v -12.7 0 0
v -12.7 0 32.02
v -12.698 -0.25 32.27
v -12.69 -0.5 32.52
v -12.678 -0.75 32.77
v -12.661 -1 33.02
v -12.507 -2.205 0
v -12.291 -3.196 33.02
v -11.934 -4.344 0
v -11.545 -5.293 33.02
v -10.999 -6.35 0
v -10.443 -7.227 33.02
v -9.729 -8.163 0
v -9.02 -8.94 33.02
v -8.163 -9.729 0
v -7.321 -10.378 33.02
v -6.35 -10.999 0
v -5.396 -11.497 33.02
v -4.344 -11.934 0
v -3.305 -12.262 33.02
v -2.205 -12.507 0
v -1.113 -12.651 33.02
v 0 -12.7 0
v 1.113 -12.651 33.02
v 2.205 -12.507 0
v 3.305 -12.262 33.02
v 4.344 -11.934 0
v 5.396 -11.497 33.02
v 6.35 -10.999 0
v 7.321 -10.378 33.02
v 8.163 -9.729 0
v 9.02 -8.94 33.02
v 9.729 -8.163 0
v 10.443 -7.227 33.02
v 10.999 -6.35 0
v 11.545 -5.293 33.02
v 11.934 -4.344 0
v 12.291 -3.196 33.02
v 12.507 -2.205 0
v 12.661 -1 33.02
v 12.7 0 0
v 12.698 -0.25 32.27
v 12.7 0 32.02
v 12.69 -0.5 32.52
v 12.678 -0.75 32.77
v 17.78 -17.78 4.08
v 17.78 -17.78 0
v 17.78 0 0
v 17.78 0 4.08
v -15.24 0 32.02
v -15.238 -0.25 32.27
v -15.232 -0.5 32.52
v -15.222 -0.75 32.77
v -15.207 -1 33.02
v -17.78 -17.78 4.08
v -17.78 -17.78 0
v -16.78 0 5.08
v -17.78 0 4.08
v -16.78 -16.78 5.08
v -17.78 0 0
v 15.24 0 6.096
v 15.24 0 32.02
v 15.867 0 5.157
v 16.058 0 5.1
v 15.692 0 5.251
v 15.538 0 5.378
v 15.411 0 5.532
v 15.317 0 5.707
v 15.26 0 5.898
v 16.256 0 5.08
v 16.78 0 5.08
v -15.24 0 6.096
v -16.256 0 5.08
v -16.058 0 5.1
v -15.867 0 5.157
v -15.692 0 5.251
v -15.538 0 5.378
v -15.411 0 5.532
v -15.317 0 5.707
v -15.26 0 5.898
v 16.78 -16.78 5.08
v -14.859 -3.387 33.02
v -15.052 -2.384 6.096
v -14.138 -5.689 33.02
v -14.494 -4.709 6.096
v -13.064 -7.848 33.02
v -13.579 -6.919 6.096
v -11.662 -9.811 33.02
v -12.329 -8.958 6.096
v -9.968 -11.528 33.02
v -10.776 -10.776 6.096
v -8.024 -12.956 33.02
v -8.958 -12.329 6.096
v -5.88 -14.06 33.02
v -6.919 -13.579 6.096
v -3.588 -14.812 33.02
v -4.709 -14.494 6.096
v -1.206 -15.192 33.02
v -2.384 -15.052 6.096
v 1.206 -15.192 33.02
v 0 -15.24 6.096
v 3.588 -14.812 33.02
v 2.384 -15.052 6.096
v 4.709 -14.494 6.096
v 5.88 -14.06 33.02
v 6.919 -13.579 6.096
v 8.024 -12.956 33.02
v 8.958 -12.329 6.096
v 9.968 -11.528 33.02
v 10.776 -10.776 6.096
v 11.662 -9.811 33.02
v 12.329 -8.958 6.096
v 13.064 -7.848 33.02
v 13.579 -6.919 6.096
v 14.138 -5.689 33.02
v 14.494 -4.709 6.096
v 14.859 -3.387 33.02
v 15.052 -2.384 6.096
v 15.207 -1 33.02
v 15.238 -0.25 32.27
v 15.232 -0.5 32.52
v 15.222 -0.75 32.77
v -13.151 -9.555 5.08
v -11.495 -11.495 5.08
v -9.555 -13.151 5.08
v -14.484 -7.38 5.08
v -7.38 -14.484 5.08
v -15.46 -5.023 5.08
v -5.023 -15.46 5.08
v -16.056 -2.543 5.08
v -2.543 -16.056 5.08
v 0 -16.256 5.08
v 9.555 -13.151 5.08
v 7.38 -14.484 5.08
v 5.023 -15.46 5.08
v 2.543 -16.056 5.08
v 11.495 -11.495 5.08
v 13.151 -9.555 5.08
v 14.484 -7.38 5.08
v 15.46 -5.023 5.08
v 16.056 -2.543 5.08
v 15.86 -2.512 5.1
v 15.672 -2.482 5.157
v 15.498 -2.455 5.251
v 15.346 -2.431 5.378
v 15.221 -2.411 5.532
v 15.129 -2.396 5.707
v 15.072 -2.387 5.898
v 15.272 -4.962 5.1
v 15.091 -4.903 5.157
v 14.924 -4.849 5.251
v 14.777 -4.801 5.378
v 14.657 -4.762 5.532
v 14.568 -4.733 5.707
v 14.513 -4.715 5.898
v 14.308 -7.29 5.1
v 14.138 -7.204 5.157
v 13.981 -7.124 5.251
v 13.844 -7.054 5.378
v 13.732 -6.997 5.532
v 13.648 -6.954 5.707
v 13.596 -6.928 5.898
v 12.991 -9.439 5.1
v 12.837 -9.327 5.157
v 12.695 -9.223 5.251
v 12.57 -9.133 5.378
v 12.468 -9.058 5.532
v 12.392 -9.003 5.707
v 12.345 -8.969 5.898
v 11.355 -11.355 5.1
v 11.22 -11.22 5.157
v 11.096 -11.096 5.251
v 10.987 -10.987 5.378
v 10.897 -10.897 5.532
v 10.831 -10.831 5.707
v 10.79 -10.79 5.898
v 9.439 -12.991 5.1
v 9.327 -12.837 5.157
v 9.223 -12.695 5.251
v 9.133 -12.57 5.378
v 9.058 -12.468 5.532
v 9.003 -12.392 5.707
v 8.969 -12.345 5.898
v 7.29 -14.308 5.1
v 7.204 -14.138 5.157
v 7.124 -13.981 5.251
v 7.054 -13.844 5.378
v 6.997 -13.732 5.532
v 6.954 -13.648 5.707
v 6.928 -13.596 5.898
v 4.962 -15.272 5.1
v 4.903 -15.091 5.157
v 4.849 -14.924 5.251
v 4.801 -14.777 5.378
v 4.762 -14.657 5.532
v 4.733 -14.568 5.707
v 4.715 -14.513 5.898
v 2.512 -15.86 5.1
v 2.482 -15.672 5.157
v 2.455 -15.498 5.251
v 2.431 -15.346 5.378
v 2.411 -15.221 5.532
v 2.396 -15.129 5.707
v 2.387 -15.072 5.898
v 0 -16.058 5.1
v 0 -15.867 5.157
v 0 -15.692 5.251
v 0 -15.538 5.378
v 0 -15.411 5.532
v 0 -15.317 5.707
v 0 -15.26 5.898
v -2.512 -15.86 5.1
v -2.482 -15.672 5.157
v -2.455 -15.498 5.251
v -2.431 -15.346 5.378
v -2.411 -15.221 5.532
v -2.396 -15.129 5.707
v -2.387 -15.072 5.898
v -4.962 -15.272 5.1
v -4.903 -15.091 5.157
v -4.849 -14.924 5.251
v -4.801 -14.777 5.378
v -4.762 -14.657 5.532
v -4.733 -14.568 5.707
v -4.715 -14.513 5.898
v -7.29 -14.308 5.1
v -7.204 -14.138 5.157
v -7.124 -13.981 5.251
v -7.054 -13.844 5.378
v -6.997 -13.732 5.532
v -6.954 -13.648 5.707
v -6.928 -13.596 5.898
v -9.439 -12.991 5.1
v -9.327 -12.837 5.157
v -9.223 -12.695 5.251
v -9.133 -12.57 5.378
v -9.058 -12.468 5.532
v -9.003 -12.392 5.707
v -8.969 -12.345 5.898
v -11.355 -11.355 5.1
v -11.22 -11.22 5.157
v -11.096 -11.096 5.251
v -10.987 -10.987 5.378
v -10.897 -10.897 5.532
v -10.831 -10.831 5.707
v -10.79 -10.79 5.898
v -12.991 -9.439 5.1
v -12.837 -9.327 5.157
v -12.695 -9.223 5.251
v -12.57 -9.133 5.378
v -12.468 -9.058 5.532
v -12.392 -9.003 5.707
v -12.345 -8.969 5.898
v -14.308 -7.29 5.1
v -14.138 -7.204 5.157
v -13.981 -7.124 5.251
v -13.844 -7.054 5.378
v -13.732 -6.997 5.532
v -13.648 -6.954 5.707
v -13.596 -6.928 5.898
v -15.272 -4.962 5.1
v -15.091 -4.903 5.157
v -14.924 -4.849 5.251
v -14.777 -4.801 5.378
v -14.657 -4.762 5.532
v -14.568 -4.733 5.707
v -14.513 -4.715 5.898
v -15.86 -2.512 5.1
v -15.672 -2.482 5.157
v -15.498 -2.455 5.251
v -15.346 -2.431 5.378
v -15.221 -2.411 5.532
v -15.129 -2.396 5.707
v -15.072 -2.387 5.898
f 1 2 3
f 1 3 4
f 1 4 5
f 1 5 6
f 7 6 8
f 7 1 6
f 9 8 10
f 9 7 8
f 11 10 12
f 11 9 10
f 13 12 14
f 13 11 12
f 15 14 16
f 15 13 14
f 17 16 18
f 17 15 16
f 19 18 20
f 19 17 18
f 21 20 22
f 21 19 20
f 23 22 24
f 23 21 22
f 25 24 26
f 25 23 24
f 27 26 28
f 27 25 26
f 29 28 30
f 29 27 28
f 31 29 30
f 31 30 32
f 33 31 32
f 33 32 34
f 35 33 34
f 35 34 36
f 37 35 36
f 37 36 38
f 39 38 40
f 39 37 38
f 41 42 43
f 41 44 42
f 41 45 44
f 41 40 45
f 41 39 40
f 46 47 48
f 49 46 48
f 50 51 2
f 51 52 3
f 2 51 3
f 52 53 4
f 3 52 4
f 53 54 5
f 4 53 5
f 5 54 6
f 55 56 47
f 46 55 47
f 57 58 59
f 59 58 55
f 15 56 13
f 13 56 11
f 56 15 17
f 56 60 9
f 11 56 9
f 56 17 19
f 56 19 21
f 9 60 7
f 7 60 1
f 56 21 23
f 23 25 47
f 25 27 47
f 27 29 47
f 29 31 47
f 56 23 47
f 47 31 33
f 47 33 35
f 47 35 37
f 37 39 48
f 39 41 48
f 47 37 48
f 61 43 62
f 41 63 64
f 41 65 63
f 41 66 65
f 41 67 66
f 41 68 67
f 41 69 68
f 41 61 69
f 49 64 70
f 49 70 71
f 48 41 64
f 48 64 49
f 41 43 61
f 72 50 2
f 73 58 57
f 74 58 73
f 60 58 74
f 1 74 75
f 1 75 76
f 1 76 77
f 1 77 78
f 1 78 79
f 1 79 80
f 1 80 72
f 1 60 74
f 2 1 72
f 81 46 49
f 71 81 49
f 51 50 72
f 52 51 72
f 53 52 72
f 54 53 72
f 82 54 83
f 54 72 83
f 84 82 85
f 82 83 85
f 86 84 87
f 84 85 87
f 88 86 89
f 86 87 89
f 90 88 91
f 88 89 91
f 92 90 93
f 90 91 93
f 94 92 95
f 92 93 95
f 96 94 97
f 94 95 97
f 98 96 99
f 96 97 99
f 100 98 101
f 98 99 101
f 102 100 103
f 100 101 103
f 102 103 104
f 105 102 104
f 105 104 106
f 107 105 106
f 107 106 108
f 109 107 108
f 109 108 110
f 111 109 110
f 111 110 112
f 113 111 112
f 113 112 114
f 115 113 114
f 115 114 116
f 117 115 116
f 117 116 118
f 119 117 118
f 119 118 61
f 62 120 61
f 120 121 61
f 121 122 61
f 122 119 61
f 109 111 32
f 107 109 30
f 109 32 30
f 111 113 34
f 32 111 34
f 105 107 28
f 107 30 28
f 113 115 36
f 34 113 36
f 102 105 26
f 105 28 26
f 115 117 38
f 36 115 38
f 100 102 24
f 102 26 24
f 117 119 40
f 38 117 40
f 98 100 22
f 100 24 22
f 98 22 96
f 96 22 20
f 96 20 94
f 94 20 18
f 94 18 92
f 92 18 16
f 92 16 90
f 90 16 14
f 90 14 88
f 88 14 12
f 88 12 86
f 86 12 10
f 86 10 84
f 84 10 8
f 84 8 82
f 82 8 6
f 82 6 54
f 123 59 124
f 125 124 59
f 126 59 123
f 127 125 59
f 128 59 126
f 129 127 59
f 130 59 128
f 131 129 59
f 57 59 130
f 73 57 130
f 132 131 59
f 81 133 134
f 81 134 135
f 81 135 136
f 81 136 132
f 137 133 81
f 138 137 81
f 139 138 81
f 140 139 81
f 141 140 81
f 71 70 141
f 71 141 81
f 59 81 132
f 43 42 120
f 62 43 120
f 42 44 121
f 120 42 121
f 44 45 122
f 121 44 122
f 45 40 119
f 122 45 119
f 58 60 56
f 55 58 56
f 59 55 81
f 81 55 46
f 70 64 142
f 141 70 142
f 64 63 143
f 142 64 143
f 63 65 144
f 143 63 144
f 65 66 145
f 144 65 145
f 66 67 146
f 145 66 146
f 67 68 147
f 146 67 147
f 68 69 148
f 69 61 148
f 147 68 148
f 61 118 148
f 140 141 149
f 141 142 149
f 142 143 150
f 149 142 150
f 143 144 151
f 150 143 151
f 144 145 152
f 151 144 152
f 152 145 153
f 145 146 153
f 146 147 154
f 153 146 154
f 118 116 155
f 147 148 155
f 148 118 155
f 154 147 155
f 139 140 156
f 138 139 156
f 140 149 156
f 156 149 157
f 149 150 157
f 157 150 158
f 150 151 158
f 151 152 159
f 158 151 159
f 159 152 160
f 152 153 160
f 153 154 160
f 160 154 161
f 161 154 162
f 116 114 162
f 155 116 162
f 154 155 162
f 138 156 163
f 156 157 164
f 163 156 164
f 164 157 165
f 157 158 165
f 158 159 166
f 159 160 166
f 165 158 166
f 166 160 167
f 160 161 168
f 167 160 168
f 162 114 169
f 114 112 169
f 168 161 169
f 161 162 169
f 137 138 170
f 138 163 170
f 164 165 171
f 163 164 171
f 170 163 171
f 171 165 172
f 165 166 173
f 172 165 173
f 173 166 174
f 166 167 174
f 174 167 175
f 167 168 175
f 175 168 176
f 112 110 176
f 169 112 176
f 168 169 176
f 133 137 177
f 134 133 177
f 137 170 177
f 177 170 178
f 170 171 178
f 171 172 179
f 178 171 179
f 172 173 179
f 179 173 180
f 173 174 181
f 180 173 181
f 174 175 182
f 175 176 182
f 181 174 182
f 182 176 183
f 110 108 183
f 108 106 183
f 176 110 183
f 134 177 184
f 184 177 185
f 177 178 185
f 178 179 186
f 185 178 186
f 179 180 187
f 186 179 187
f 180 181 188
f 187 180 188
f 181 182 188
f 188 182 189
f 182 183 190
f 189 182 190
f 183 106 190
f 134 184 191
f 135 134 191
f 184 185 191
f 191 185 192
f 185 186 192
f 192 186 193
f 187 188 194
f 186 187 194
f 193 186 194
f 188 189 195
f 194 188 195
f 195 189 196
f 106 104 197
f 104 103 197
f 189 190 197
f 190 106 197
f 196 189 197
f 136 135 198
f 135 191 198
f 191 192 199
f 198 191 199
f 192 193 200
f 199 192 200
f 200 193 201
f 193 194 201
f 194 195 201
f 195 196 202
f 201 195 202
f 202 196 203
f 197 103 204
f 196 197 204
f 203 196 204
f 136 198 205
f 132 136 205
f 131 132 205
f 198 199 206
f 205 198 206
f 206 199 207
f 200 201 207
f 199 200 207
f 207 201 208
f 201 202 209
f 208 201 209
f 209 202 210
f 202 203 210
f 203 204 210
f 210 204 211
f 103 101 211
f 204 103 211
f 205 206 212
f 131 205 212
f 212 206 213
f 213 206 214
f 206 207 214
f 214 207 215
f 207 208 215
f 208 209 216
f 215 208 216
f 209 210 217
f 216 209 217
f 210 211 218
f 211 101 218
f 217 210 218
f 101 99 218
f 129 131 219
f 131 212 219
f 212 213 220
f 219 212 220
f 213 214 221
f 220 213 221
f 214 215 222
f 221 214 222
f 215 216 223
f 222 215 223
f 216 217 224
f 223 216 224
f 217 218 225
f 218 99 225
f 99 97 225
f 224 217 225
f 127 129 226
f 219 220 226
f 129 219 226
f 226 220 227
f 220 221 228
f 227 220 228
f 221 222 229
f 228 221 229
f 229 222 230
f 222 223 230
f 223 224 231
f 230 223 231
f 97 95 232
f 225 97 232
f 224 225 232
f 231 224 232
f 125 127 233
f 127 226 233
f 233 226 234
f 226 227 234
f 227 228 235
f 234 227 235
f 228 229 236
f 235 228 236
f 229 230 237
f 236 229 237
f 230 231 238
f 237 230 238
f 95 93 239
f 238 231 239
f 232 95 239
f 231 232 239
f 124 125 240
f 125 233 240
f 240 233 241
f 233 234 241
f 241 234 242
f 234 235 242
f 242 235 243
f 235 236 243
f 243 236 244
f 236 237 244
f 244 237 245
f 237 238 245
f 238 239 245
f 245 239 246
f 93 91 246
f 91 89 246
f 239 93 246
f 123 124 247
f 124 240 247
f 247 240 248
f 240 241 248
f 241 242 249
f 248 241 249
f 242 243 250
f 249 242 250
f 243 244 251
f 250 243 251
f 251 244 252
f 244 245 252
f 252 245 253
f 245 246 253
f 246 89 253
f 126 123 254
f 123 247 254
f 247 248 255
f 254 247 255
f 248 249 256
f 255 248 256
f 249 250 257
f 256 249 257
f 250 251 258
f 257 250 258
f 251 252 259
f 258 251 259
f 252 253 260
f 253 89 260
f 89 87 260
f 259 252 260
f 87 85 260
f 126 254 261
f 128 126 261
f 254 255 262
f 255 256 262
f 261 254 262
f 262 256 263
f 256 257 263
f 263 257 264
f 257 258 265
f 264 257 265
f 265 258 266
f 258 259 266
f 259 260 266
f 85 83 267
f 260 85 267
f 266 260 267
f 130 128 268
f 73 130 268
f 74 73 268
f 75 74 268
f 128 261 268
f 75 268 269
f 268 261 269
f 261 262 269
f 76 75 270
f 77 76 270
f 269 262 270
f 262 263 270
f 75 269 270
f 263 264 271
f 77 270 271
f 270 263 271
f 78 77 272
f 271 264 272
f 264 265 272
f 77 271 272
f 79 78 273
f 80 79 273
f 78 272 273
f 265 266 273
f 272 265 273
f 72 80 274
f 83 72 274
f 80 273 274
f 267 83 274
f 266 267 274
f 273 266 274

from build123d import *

# Parameters (mm, degrees)
PAD_DEPTH    = 33.02
PAD001_DEPTH = 5.08
FILLET_R     = 1.016
CHAMFER_SIZE = 1


with BuildPart() as part:
    # Sketch001 → Pad (new body)
    with BuildSketch(Plane.XY):
        with BuildLine():
            ThreePointArc((-12.7, 0), (0, -12.7), (12.7, 0))
            Line((12.7, 0), (15.24, 0))
            ThreePointArc((-15.24, 0), (0, -15.24), (15.24, 0))
            Line((-15.24, 0), (-12.7, 0))
        make_face()
    extrude(amount=PAD_DEPTH)

    # Sketch → Pad001 (join)
    with BuildSketch(Plane.XY):
        with BuildLine():
            Line((-17.78, 0), (-17.78, -17.78))
            Line((-17.78, -17.78), (17.78, -17.78))
            Line((17.78, -17.78), (17.78, 0))
            Line((12.7, 0), (17.78, 0))
            ThreePointArc((-12.7, 0), (0, -12.7), (12.7, 0))
            Line((-17.78, 0), (-12.7, 0))
        make_face()
    extrude(amount=PAD001_DEPTH)

    # Fillet
    fillet_edges = [part.edges().sort_by_distance(p)[0] for p in [
        (0, -15.24, 5.08),
    ]]
    fillet(fillet_edges, radius=FILLET_R)

    # Chamfer
    chamfer_edges = [part.edges().sort_by_distance(p)[0] for p in [
        (-13.97, 0, 33.02),
        (13.97, 0, 33.02),
        (-17.78, -8.89, 5.08),
        (17.78, -8.89, 5.08),
        (0, -17.78, 5.08),
    ]]
    chamfer(chamfer_edges, length=CHAMFER_SIZE)


solid = part.part
